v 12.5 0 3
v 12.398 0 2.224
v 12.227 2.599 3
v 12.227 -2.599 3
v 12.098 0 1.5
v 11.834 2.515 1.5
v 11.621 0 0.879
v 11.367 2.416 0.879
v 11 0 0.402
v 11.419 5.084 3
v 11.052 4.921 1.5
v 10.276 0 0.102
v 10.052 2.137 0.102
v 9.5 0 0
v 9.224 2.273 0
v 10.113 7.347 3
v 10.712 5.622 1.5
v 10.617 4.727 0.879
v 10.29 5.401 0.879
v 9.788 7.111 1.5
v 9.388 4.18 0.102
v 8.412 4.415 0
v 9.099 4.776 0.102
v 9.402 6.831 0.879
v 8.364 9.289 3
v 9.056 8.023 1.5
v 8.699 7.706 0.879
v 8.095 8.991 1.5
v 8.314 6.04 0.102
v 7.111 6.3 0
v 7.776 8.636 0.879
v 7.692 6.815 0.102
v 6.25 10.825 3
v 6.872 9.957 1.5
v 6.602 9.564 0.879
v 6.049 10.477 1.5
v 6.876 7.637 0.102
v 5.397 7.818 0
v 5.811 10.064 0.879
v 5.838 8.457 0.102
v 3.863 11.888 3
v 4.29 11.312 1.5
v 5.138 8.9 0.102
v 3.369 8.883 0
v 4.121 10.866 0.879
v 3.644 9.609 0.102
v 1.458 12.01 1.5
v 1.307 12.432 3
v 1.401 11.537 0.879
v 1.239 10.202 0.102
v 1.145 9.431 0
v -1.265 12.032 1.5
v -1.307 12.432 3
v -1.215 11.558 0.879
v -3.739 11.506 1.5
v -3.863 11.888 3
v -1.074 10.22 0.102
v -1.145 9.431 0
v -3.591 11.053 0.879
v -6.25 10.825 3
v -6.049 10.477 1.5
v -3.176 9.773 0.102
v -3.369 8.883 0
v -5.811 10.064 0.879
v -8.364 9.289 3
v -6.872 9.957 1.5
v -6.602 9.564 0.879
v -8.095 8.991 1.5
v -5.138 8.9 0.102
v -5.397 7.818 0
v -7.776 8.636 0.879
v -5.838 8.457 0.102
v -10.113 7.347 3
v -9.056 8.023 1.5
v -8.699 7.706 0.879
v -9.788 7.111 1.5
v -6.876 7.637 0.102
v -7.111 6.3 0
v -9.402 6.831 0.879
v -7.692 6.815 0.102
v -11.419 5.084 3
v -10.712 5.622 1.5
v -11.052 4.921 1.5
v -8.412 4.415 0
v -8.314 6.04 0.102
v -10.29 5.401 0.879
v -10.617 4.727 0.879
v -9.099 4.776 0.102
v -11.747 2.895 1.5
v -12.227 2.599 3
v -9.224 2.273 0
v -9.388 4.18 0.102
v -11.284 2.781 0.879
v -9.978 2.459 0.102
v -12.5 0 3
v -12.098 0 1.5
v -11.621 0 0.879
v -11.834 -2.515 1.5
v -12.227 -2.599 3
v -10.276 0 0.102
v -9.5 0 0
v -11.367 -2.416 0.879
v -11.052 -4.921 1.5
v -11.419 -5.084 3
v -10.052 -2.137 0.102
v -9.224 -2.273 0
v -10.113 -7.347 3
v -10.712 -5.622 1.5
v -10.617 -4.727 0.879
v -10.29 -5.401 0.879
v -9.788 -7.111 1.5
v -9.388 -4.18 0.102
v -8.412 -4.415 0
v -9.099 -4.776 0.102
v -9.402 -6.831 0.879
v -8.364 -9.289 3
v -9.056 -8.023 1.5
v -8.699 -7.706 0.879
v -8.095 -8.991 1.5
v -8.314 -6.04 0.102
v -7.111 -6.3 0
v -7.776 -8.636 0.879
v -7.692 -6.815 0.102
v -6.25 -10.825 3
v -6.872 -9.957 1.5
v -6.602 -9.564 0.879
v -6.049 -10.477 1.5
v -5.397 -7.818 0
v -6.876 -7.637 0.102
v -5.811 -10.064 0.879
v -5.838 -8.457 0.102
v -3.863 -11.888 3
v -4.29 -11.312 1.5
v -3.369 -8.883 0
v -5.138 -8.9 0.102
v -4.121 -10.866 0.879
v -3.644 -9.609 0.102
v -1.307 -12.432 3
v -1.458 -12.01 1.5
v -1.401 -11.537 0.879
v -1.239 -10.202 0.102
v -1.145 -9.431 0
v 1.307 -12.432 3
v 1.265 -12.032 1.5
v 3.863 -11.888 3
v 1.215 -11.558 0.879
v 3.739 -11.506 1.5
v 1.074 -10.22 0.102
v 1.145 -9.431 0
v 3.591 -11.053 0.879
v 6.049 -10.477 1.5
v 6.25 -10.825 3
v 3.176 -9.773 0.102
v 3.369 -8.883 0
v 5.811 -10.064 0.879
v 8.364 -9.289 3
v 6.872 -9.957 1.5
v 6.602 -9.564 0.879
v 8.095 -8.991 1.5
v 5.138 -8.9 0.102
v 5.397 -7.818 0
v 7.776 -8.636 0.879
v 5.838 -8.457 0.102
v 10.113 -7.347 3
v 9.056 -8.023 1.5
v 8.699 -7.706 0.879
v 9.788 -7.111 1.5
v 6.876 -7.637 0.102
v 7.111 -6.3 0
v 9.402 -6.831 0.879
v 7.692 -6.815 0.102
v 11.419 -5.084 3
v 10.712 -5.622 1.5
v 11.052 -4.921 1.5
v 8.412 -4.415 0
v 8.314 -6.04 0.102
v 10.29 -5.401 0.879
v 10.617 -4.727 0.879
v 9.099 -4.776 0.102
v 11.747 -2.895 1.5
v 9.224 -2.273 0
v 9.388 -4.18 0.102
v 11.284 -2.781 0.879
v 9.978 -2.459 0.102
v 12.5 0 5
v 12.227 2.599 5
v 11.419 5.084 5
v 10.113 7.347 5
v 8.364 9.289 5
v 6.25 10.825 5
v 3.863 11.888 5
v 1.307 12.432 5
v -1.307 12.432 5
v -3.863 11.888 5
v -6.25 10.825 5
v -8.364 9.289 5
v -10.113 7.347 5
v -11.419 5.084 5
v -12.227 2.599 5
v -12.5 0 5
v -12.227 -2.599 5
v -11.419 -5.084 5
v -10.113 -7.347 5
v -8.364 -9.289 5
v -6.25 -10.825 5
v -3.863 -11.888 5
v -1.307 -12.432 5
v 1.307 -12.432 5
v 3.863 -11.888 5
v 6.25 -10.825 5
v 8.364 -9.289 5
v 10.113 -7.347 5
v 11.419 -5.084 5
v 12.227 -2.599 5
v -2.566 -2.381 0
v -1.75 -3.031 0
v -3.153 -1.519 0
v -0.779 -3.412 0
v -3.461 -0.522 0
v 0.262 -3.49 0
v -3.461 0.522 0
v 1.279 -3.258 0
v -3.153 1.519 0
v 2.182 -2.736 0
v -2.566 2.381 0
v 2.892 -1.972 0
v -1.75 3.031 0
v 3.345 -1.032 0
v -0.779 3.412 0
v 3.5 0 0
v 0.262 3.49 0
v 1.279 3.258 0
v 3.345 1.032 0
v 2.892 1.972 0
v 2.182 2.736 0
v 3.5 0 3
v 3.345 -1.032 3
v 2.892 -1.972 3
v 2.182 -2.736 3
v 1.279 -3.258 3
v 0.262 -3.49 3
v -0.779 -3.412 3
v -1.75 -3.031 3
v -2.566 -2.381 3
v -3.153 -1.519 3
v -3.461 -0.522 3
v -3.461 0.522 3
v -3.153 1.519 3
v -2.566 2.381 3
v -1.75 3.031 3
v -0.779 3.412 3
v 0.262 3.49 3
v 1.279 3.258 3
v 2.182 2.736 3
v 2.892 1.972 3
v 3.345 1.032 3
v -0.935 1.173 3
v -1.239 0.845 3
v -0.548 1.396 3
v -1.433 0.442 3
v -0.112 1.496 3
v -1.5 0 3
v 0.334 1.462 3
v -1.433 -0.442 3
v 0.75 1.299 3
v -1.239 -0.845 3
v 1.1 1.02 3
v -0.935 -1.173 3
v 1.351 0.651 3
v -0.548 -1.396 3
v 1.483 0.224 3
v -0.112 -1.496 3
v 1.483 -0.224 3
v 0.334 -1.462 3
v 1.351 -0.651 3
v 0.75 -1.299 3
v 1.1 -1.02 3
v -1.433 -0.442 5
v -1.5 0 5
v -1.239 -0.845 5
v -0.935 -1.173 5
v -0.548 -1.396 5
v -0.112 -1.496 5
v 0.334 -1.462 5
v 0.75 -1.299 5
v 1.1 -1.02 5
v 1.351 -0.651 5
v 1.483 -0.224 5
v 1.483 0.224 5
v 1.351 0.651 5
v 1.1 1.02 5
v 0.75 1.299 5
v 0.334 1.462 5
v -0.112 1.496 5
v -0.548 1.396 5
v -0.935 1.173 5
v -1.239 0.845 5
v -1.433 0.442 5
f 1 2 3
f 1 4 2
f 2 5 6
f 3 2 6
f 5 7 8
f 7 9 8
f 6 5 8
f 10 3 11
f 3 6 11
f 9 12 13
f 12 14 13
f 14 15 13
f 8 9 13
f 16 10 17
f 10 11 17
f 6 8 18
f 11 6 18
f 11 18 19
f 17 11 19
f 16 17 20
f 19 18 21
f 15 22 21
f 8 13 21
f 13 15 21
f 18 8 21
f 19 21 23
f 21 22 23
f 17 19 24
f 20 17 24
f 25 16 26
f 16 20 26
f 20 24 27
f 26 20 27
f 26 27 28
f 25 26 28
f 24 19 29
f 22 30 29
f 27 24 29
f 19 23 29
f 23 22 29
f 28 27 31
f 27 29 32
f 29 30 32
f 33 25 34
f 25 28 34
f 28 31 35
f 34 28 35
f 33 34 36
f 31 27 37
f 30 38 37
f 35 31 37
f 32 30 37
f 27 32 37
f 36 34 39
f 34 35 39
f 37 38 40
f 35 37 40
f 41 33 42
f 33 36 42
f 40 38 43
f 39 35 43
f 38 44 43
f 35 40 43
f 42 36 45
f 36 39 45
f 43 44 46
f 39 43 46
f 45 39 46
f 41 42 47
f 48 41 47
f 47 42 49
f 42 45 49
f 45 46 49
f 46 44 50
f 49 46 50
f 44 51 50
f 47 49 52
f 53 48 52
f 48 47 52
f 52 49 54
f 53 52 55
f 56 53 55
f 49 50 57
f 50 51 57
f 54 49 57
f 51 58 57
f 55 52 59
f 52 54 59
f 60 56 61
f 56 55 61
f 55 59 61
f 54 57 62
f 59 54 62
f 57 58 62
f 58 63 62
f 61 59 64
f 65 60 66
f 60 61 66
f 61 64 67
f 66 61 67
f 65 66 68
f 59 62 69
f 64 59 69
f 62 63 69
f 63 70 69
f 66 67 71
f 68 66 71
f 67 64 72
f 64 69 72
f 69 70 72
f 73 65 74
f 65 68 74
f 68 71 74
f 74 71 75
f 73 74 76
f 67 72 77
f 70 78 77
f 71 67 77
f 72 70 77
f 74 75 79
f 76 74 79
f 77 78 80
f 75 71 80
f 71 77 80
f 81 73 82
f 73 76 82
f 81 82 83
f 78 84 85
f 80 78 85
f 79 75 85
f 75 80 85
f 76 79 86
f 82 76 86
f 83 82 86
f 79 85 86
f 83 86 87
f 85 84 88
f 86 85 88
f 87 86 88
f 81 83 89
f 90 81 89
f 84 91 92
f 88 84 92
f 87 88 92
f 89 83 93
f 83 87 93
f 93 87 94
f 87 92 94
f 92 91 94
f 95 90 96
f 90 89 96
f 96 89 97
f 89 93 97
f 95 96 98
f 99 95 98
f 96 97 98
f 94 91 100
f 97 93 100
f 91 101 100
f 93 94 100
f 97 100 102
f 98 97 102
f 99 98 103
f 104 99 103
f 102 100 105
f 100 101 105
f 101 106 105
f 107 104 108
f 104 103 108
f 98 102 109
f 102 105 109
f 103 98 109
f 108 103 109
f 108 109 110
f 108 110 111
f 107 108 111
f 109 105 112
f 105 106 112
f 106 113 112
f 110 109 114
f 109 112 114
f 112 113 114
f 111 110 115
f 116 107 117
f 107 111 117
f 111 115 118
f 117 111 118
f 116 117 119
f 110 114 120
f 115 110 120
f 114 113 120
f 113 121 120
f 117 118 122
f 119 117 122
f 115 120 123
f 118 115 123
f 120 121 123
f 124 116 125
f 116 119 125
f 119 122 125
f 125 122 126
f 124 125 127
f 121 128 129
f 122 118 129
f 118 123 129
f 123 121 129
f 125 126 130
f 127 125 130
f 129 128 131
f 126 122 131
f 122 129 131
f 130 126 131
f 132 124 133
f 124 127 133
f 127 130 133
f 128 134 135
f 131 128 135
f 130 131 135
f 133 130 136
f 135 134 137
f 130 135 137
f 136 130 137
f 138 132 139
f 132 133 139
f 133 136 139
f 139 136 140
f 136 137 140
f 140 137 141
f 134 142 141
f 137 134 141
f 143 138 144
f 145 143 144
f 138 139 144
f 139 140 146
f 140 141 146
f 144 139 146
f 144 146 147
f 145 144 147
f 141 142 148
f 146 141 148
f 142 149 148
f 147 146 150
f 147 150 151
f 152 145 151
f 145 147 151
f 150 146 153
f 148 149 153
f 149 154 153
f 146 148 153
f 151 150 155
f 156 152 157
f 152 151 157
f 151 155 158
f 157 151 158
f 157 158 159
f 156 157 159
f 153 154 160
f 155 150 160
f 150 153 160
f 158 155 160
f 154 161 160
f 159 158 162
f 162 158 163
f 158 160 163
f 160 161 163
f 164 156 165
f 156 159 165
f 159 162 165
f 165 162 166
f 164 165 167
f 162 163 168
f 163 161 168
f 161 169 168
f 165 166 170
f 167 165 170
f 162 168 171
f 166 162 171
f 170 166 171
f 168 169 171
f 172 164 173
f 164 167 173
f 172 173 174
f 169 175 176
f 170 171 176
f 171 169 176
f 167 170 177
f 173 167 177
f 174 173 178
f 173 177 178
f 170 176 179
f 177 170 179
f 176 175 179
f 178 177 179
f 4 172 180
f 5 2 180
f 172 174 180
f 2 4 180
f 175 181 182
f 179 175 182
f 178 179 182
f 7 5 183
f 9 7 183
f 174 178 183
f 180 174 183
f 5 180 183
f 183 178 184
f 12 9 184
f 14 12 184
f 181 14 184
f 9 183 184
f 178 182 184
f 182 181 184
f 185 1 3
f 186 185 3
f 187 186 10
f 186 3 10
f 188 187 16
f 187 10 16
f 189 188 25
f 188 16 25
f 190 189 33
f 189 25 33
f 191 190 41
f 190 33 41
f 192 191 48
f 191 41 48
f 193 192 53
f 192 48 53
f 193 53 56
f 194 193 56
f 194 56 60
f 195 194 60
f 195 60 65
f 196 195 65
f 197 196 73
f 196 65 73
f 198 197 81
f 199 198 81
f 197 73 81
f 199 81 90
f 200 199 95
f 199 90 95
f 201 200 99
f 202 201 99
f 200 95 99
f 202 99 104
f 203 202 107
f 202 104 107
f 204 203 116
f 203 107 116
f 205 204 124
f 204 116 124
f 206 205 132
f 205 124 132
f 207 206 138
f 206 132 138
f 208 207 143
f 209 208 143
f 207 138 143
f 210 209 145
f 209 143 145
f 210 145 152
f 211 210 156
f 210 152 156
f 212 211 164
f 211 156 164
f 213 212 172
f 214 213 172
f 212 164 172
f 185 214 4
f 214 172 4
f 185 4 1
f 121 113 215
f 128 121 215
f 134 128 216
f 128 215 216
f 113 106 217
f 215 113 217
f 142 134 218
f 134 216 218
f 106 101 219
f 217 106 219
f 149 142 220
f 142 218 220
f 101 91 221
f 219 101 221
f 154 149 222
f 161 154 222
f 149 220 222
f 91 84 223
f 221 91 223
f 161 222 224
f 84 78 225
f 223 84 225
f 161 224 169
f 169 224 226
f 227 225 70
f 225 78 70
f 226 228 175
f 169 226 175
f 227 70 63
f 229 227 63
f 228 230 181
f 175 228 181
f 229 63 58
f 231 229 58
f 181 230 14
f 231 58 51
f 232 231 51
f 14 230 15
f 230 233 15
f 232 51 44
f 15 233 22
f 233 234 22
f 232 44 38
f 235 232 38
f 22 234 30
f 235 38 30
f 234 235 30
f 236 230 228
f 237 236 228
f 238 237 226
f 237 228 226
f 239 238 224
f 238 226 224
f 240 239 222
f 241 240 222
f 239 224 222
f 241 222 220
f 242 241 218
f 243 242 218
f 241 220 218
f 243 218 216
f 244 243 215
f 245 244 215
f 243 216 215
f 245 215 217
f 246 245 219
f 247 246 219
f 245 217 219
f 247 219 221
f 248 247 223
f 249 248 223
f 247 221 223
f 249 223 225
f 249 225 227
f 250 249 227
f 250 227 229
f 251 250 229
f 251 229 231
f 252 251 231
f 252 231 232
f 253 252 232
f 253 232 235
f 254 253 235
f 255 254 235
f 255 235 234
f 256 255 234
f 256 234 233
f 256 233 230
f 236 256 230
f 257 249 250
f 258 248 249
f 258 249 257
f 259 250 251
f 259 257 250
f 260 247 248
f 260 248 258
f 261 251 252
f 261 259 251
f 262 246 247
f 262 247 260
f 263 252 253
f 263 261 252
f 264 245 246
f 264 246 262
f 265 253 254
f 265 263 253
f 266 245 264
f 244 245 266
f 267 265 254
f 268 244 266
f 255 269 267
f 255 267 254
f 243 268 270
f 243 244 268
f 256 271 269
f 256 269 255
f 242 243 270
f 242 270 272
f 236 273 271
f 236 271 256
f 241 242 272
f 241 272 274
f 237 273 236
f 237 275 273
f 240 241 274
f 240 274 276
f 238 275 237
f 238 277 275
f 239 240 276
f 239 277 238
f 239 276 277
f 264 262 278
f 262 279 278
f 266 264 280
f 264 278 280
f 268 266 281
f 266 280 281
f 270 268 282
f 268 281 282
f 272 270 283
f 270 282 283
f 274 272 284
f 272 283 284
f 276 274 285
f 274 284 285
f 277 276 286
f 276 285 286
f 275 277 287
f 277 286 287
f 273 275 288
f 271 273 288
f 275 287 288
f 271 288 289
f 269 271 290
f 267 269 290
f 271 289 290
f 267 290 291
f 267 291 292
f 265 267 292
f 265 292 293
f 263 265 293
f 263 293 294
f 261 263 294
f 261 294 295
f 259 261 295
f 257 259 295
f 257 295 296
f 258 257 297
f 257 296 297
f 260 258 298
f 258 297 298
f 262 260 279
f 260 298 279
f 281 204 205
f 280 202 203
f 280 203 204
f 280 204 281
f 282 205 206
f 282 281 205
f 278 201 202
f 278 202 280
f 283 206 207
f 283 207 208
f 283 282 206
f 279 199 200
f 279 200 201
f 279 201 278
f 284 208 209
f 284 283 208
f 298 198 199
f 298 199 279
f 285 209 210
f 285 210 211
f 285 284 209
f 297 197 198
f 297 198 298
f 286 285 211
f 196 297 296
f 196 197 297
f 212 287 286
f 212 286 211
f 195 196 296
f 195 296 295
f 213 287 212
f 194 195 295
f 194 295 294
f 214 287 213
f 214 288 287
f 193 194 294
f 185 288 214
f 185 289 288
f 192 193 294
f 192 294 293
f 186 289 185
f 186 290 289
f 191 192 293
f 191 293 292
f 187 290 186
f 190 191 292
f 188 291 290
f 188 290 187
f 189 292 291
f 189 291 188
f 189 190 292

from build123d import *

# Parameters (mm, degrees)
F5_R           = 12.5
F6_DEPTH       = 5
F7_D           = 3
F7_CBORE_D     = 7
F7_CBORE_DEPTH = 3
F8_R           = 3


with BuildPart() as f6:
    # F5 (on Top) → F6 (new body)
    with BuildSketch(Plane.XY):
        Circle(F5_R)
    extrude(amount=F6_DEPTH)

    # F7 (through all)
    with Locations(Plane(origin=(0, 0, 0), x_dir=(1, 0, 0), z_dir=(0, 0, -1))):
        with Locations((0, 0)):
            CounterBoreHole(F7_D / 2, F7_CBORE_D / 2, F7_CBORE_DEPTH)

    # F8
    f8_edges = [f6.edges().sort_by_distance(p)[0] for p in [
        (-12.5, 0, 0),
    ]]
    fillet(f8_edges, radius=F8_R)


solid = f6.part
